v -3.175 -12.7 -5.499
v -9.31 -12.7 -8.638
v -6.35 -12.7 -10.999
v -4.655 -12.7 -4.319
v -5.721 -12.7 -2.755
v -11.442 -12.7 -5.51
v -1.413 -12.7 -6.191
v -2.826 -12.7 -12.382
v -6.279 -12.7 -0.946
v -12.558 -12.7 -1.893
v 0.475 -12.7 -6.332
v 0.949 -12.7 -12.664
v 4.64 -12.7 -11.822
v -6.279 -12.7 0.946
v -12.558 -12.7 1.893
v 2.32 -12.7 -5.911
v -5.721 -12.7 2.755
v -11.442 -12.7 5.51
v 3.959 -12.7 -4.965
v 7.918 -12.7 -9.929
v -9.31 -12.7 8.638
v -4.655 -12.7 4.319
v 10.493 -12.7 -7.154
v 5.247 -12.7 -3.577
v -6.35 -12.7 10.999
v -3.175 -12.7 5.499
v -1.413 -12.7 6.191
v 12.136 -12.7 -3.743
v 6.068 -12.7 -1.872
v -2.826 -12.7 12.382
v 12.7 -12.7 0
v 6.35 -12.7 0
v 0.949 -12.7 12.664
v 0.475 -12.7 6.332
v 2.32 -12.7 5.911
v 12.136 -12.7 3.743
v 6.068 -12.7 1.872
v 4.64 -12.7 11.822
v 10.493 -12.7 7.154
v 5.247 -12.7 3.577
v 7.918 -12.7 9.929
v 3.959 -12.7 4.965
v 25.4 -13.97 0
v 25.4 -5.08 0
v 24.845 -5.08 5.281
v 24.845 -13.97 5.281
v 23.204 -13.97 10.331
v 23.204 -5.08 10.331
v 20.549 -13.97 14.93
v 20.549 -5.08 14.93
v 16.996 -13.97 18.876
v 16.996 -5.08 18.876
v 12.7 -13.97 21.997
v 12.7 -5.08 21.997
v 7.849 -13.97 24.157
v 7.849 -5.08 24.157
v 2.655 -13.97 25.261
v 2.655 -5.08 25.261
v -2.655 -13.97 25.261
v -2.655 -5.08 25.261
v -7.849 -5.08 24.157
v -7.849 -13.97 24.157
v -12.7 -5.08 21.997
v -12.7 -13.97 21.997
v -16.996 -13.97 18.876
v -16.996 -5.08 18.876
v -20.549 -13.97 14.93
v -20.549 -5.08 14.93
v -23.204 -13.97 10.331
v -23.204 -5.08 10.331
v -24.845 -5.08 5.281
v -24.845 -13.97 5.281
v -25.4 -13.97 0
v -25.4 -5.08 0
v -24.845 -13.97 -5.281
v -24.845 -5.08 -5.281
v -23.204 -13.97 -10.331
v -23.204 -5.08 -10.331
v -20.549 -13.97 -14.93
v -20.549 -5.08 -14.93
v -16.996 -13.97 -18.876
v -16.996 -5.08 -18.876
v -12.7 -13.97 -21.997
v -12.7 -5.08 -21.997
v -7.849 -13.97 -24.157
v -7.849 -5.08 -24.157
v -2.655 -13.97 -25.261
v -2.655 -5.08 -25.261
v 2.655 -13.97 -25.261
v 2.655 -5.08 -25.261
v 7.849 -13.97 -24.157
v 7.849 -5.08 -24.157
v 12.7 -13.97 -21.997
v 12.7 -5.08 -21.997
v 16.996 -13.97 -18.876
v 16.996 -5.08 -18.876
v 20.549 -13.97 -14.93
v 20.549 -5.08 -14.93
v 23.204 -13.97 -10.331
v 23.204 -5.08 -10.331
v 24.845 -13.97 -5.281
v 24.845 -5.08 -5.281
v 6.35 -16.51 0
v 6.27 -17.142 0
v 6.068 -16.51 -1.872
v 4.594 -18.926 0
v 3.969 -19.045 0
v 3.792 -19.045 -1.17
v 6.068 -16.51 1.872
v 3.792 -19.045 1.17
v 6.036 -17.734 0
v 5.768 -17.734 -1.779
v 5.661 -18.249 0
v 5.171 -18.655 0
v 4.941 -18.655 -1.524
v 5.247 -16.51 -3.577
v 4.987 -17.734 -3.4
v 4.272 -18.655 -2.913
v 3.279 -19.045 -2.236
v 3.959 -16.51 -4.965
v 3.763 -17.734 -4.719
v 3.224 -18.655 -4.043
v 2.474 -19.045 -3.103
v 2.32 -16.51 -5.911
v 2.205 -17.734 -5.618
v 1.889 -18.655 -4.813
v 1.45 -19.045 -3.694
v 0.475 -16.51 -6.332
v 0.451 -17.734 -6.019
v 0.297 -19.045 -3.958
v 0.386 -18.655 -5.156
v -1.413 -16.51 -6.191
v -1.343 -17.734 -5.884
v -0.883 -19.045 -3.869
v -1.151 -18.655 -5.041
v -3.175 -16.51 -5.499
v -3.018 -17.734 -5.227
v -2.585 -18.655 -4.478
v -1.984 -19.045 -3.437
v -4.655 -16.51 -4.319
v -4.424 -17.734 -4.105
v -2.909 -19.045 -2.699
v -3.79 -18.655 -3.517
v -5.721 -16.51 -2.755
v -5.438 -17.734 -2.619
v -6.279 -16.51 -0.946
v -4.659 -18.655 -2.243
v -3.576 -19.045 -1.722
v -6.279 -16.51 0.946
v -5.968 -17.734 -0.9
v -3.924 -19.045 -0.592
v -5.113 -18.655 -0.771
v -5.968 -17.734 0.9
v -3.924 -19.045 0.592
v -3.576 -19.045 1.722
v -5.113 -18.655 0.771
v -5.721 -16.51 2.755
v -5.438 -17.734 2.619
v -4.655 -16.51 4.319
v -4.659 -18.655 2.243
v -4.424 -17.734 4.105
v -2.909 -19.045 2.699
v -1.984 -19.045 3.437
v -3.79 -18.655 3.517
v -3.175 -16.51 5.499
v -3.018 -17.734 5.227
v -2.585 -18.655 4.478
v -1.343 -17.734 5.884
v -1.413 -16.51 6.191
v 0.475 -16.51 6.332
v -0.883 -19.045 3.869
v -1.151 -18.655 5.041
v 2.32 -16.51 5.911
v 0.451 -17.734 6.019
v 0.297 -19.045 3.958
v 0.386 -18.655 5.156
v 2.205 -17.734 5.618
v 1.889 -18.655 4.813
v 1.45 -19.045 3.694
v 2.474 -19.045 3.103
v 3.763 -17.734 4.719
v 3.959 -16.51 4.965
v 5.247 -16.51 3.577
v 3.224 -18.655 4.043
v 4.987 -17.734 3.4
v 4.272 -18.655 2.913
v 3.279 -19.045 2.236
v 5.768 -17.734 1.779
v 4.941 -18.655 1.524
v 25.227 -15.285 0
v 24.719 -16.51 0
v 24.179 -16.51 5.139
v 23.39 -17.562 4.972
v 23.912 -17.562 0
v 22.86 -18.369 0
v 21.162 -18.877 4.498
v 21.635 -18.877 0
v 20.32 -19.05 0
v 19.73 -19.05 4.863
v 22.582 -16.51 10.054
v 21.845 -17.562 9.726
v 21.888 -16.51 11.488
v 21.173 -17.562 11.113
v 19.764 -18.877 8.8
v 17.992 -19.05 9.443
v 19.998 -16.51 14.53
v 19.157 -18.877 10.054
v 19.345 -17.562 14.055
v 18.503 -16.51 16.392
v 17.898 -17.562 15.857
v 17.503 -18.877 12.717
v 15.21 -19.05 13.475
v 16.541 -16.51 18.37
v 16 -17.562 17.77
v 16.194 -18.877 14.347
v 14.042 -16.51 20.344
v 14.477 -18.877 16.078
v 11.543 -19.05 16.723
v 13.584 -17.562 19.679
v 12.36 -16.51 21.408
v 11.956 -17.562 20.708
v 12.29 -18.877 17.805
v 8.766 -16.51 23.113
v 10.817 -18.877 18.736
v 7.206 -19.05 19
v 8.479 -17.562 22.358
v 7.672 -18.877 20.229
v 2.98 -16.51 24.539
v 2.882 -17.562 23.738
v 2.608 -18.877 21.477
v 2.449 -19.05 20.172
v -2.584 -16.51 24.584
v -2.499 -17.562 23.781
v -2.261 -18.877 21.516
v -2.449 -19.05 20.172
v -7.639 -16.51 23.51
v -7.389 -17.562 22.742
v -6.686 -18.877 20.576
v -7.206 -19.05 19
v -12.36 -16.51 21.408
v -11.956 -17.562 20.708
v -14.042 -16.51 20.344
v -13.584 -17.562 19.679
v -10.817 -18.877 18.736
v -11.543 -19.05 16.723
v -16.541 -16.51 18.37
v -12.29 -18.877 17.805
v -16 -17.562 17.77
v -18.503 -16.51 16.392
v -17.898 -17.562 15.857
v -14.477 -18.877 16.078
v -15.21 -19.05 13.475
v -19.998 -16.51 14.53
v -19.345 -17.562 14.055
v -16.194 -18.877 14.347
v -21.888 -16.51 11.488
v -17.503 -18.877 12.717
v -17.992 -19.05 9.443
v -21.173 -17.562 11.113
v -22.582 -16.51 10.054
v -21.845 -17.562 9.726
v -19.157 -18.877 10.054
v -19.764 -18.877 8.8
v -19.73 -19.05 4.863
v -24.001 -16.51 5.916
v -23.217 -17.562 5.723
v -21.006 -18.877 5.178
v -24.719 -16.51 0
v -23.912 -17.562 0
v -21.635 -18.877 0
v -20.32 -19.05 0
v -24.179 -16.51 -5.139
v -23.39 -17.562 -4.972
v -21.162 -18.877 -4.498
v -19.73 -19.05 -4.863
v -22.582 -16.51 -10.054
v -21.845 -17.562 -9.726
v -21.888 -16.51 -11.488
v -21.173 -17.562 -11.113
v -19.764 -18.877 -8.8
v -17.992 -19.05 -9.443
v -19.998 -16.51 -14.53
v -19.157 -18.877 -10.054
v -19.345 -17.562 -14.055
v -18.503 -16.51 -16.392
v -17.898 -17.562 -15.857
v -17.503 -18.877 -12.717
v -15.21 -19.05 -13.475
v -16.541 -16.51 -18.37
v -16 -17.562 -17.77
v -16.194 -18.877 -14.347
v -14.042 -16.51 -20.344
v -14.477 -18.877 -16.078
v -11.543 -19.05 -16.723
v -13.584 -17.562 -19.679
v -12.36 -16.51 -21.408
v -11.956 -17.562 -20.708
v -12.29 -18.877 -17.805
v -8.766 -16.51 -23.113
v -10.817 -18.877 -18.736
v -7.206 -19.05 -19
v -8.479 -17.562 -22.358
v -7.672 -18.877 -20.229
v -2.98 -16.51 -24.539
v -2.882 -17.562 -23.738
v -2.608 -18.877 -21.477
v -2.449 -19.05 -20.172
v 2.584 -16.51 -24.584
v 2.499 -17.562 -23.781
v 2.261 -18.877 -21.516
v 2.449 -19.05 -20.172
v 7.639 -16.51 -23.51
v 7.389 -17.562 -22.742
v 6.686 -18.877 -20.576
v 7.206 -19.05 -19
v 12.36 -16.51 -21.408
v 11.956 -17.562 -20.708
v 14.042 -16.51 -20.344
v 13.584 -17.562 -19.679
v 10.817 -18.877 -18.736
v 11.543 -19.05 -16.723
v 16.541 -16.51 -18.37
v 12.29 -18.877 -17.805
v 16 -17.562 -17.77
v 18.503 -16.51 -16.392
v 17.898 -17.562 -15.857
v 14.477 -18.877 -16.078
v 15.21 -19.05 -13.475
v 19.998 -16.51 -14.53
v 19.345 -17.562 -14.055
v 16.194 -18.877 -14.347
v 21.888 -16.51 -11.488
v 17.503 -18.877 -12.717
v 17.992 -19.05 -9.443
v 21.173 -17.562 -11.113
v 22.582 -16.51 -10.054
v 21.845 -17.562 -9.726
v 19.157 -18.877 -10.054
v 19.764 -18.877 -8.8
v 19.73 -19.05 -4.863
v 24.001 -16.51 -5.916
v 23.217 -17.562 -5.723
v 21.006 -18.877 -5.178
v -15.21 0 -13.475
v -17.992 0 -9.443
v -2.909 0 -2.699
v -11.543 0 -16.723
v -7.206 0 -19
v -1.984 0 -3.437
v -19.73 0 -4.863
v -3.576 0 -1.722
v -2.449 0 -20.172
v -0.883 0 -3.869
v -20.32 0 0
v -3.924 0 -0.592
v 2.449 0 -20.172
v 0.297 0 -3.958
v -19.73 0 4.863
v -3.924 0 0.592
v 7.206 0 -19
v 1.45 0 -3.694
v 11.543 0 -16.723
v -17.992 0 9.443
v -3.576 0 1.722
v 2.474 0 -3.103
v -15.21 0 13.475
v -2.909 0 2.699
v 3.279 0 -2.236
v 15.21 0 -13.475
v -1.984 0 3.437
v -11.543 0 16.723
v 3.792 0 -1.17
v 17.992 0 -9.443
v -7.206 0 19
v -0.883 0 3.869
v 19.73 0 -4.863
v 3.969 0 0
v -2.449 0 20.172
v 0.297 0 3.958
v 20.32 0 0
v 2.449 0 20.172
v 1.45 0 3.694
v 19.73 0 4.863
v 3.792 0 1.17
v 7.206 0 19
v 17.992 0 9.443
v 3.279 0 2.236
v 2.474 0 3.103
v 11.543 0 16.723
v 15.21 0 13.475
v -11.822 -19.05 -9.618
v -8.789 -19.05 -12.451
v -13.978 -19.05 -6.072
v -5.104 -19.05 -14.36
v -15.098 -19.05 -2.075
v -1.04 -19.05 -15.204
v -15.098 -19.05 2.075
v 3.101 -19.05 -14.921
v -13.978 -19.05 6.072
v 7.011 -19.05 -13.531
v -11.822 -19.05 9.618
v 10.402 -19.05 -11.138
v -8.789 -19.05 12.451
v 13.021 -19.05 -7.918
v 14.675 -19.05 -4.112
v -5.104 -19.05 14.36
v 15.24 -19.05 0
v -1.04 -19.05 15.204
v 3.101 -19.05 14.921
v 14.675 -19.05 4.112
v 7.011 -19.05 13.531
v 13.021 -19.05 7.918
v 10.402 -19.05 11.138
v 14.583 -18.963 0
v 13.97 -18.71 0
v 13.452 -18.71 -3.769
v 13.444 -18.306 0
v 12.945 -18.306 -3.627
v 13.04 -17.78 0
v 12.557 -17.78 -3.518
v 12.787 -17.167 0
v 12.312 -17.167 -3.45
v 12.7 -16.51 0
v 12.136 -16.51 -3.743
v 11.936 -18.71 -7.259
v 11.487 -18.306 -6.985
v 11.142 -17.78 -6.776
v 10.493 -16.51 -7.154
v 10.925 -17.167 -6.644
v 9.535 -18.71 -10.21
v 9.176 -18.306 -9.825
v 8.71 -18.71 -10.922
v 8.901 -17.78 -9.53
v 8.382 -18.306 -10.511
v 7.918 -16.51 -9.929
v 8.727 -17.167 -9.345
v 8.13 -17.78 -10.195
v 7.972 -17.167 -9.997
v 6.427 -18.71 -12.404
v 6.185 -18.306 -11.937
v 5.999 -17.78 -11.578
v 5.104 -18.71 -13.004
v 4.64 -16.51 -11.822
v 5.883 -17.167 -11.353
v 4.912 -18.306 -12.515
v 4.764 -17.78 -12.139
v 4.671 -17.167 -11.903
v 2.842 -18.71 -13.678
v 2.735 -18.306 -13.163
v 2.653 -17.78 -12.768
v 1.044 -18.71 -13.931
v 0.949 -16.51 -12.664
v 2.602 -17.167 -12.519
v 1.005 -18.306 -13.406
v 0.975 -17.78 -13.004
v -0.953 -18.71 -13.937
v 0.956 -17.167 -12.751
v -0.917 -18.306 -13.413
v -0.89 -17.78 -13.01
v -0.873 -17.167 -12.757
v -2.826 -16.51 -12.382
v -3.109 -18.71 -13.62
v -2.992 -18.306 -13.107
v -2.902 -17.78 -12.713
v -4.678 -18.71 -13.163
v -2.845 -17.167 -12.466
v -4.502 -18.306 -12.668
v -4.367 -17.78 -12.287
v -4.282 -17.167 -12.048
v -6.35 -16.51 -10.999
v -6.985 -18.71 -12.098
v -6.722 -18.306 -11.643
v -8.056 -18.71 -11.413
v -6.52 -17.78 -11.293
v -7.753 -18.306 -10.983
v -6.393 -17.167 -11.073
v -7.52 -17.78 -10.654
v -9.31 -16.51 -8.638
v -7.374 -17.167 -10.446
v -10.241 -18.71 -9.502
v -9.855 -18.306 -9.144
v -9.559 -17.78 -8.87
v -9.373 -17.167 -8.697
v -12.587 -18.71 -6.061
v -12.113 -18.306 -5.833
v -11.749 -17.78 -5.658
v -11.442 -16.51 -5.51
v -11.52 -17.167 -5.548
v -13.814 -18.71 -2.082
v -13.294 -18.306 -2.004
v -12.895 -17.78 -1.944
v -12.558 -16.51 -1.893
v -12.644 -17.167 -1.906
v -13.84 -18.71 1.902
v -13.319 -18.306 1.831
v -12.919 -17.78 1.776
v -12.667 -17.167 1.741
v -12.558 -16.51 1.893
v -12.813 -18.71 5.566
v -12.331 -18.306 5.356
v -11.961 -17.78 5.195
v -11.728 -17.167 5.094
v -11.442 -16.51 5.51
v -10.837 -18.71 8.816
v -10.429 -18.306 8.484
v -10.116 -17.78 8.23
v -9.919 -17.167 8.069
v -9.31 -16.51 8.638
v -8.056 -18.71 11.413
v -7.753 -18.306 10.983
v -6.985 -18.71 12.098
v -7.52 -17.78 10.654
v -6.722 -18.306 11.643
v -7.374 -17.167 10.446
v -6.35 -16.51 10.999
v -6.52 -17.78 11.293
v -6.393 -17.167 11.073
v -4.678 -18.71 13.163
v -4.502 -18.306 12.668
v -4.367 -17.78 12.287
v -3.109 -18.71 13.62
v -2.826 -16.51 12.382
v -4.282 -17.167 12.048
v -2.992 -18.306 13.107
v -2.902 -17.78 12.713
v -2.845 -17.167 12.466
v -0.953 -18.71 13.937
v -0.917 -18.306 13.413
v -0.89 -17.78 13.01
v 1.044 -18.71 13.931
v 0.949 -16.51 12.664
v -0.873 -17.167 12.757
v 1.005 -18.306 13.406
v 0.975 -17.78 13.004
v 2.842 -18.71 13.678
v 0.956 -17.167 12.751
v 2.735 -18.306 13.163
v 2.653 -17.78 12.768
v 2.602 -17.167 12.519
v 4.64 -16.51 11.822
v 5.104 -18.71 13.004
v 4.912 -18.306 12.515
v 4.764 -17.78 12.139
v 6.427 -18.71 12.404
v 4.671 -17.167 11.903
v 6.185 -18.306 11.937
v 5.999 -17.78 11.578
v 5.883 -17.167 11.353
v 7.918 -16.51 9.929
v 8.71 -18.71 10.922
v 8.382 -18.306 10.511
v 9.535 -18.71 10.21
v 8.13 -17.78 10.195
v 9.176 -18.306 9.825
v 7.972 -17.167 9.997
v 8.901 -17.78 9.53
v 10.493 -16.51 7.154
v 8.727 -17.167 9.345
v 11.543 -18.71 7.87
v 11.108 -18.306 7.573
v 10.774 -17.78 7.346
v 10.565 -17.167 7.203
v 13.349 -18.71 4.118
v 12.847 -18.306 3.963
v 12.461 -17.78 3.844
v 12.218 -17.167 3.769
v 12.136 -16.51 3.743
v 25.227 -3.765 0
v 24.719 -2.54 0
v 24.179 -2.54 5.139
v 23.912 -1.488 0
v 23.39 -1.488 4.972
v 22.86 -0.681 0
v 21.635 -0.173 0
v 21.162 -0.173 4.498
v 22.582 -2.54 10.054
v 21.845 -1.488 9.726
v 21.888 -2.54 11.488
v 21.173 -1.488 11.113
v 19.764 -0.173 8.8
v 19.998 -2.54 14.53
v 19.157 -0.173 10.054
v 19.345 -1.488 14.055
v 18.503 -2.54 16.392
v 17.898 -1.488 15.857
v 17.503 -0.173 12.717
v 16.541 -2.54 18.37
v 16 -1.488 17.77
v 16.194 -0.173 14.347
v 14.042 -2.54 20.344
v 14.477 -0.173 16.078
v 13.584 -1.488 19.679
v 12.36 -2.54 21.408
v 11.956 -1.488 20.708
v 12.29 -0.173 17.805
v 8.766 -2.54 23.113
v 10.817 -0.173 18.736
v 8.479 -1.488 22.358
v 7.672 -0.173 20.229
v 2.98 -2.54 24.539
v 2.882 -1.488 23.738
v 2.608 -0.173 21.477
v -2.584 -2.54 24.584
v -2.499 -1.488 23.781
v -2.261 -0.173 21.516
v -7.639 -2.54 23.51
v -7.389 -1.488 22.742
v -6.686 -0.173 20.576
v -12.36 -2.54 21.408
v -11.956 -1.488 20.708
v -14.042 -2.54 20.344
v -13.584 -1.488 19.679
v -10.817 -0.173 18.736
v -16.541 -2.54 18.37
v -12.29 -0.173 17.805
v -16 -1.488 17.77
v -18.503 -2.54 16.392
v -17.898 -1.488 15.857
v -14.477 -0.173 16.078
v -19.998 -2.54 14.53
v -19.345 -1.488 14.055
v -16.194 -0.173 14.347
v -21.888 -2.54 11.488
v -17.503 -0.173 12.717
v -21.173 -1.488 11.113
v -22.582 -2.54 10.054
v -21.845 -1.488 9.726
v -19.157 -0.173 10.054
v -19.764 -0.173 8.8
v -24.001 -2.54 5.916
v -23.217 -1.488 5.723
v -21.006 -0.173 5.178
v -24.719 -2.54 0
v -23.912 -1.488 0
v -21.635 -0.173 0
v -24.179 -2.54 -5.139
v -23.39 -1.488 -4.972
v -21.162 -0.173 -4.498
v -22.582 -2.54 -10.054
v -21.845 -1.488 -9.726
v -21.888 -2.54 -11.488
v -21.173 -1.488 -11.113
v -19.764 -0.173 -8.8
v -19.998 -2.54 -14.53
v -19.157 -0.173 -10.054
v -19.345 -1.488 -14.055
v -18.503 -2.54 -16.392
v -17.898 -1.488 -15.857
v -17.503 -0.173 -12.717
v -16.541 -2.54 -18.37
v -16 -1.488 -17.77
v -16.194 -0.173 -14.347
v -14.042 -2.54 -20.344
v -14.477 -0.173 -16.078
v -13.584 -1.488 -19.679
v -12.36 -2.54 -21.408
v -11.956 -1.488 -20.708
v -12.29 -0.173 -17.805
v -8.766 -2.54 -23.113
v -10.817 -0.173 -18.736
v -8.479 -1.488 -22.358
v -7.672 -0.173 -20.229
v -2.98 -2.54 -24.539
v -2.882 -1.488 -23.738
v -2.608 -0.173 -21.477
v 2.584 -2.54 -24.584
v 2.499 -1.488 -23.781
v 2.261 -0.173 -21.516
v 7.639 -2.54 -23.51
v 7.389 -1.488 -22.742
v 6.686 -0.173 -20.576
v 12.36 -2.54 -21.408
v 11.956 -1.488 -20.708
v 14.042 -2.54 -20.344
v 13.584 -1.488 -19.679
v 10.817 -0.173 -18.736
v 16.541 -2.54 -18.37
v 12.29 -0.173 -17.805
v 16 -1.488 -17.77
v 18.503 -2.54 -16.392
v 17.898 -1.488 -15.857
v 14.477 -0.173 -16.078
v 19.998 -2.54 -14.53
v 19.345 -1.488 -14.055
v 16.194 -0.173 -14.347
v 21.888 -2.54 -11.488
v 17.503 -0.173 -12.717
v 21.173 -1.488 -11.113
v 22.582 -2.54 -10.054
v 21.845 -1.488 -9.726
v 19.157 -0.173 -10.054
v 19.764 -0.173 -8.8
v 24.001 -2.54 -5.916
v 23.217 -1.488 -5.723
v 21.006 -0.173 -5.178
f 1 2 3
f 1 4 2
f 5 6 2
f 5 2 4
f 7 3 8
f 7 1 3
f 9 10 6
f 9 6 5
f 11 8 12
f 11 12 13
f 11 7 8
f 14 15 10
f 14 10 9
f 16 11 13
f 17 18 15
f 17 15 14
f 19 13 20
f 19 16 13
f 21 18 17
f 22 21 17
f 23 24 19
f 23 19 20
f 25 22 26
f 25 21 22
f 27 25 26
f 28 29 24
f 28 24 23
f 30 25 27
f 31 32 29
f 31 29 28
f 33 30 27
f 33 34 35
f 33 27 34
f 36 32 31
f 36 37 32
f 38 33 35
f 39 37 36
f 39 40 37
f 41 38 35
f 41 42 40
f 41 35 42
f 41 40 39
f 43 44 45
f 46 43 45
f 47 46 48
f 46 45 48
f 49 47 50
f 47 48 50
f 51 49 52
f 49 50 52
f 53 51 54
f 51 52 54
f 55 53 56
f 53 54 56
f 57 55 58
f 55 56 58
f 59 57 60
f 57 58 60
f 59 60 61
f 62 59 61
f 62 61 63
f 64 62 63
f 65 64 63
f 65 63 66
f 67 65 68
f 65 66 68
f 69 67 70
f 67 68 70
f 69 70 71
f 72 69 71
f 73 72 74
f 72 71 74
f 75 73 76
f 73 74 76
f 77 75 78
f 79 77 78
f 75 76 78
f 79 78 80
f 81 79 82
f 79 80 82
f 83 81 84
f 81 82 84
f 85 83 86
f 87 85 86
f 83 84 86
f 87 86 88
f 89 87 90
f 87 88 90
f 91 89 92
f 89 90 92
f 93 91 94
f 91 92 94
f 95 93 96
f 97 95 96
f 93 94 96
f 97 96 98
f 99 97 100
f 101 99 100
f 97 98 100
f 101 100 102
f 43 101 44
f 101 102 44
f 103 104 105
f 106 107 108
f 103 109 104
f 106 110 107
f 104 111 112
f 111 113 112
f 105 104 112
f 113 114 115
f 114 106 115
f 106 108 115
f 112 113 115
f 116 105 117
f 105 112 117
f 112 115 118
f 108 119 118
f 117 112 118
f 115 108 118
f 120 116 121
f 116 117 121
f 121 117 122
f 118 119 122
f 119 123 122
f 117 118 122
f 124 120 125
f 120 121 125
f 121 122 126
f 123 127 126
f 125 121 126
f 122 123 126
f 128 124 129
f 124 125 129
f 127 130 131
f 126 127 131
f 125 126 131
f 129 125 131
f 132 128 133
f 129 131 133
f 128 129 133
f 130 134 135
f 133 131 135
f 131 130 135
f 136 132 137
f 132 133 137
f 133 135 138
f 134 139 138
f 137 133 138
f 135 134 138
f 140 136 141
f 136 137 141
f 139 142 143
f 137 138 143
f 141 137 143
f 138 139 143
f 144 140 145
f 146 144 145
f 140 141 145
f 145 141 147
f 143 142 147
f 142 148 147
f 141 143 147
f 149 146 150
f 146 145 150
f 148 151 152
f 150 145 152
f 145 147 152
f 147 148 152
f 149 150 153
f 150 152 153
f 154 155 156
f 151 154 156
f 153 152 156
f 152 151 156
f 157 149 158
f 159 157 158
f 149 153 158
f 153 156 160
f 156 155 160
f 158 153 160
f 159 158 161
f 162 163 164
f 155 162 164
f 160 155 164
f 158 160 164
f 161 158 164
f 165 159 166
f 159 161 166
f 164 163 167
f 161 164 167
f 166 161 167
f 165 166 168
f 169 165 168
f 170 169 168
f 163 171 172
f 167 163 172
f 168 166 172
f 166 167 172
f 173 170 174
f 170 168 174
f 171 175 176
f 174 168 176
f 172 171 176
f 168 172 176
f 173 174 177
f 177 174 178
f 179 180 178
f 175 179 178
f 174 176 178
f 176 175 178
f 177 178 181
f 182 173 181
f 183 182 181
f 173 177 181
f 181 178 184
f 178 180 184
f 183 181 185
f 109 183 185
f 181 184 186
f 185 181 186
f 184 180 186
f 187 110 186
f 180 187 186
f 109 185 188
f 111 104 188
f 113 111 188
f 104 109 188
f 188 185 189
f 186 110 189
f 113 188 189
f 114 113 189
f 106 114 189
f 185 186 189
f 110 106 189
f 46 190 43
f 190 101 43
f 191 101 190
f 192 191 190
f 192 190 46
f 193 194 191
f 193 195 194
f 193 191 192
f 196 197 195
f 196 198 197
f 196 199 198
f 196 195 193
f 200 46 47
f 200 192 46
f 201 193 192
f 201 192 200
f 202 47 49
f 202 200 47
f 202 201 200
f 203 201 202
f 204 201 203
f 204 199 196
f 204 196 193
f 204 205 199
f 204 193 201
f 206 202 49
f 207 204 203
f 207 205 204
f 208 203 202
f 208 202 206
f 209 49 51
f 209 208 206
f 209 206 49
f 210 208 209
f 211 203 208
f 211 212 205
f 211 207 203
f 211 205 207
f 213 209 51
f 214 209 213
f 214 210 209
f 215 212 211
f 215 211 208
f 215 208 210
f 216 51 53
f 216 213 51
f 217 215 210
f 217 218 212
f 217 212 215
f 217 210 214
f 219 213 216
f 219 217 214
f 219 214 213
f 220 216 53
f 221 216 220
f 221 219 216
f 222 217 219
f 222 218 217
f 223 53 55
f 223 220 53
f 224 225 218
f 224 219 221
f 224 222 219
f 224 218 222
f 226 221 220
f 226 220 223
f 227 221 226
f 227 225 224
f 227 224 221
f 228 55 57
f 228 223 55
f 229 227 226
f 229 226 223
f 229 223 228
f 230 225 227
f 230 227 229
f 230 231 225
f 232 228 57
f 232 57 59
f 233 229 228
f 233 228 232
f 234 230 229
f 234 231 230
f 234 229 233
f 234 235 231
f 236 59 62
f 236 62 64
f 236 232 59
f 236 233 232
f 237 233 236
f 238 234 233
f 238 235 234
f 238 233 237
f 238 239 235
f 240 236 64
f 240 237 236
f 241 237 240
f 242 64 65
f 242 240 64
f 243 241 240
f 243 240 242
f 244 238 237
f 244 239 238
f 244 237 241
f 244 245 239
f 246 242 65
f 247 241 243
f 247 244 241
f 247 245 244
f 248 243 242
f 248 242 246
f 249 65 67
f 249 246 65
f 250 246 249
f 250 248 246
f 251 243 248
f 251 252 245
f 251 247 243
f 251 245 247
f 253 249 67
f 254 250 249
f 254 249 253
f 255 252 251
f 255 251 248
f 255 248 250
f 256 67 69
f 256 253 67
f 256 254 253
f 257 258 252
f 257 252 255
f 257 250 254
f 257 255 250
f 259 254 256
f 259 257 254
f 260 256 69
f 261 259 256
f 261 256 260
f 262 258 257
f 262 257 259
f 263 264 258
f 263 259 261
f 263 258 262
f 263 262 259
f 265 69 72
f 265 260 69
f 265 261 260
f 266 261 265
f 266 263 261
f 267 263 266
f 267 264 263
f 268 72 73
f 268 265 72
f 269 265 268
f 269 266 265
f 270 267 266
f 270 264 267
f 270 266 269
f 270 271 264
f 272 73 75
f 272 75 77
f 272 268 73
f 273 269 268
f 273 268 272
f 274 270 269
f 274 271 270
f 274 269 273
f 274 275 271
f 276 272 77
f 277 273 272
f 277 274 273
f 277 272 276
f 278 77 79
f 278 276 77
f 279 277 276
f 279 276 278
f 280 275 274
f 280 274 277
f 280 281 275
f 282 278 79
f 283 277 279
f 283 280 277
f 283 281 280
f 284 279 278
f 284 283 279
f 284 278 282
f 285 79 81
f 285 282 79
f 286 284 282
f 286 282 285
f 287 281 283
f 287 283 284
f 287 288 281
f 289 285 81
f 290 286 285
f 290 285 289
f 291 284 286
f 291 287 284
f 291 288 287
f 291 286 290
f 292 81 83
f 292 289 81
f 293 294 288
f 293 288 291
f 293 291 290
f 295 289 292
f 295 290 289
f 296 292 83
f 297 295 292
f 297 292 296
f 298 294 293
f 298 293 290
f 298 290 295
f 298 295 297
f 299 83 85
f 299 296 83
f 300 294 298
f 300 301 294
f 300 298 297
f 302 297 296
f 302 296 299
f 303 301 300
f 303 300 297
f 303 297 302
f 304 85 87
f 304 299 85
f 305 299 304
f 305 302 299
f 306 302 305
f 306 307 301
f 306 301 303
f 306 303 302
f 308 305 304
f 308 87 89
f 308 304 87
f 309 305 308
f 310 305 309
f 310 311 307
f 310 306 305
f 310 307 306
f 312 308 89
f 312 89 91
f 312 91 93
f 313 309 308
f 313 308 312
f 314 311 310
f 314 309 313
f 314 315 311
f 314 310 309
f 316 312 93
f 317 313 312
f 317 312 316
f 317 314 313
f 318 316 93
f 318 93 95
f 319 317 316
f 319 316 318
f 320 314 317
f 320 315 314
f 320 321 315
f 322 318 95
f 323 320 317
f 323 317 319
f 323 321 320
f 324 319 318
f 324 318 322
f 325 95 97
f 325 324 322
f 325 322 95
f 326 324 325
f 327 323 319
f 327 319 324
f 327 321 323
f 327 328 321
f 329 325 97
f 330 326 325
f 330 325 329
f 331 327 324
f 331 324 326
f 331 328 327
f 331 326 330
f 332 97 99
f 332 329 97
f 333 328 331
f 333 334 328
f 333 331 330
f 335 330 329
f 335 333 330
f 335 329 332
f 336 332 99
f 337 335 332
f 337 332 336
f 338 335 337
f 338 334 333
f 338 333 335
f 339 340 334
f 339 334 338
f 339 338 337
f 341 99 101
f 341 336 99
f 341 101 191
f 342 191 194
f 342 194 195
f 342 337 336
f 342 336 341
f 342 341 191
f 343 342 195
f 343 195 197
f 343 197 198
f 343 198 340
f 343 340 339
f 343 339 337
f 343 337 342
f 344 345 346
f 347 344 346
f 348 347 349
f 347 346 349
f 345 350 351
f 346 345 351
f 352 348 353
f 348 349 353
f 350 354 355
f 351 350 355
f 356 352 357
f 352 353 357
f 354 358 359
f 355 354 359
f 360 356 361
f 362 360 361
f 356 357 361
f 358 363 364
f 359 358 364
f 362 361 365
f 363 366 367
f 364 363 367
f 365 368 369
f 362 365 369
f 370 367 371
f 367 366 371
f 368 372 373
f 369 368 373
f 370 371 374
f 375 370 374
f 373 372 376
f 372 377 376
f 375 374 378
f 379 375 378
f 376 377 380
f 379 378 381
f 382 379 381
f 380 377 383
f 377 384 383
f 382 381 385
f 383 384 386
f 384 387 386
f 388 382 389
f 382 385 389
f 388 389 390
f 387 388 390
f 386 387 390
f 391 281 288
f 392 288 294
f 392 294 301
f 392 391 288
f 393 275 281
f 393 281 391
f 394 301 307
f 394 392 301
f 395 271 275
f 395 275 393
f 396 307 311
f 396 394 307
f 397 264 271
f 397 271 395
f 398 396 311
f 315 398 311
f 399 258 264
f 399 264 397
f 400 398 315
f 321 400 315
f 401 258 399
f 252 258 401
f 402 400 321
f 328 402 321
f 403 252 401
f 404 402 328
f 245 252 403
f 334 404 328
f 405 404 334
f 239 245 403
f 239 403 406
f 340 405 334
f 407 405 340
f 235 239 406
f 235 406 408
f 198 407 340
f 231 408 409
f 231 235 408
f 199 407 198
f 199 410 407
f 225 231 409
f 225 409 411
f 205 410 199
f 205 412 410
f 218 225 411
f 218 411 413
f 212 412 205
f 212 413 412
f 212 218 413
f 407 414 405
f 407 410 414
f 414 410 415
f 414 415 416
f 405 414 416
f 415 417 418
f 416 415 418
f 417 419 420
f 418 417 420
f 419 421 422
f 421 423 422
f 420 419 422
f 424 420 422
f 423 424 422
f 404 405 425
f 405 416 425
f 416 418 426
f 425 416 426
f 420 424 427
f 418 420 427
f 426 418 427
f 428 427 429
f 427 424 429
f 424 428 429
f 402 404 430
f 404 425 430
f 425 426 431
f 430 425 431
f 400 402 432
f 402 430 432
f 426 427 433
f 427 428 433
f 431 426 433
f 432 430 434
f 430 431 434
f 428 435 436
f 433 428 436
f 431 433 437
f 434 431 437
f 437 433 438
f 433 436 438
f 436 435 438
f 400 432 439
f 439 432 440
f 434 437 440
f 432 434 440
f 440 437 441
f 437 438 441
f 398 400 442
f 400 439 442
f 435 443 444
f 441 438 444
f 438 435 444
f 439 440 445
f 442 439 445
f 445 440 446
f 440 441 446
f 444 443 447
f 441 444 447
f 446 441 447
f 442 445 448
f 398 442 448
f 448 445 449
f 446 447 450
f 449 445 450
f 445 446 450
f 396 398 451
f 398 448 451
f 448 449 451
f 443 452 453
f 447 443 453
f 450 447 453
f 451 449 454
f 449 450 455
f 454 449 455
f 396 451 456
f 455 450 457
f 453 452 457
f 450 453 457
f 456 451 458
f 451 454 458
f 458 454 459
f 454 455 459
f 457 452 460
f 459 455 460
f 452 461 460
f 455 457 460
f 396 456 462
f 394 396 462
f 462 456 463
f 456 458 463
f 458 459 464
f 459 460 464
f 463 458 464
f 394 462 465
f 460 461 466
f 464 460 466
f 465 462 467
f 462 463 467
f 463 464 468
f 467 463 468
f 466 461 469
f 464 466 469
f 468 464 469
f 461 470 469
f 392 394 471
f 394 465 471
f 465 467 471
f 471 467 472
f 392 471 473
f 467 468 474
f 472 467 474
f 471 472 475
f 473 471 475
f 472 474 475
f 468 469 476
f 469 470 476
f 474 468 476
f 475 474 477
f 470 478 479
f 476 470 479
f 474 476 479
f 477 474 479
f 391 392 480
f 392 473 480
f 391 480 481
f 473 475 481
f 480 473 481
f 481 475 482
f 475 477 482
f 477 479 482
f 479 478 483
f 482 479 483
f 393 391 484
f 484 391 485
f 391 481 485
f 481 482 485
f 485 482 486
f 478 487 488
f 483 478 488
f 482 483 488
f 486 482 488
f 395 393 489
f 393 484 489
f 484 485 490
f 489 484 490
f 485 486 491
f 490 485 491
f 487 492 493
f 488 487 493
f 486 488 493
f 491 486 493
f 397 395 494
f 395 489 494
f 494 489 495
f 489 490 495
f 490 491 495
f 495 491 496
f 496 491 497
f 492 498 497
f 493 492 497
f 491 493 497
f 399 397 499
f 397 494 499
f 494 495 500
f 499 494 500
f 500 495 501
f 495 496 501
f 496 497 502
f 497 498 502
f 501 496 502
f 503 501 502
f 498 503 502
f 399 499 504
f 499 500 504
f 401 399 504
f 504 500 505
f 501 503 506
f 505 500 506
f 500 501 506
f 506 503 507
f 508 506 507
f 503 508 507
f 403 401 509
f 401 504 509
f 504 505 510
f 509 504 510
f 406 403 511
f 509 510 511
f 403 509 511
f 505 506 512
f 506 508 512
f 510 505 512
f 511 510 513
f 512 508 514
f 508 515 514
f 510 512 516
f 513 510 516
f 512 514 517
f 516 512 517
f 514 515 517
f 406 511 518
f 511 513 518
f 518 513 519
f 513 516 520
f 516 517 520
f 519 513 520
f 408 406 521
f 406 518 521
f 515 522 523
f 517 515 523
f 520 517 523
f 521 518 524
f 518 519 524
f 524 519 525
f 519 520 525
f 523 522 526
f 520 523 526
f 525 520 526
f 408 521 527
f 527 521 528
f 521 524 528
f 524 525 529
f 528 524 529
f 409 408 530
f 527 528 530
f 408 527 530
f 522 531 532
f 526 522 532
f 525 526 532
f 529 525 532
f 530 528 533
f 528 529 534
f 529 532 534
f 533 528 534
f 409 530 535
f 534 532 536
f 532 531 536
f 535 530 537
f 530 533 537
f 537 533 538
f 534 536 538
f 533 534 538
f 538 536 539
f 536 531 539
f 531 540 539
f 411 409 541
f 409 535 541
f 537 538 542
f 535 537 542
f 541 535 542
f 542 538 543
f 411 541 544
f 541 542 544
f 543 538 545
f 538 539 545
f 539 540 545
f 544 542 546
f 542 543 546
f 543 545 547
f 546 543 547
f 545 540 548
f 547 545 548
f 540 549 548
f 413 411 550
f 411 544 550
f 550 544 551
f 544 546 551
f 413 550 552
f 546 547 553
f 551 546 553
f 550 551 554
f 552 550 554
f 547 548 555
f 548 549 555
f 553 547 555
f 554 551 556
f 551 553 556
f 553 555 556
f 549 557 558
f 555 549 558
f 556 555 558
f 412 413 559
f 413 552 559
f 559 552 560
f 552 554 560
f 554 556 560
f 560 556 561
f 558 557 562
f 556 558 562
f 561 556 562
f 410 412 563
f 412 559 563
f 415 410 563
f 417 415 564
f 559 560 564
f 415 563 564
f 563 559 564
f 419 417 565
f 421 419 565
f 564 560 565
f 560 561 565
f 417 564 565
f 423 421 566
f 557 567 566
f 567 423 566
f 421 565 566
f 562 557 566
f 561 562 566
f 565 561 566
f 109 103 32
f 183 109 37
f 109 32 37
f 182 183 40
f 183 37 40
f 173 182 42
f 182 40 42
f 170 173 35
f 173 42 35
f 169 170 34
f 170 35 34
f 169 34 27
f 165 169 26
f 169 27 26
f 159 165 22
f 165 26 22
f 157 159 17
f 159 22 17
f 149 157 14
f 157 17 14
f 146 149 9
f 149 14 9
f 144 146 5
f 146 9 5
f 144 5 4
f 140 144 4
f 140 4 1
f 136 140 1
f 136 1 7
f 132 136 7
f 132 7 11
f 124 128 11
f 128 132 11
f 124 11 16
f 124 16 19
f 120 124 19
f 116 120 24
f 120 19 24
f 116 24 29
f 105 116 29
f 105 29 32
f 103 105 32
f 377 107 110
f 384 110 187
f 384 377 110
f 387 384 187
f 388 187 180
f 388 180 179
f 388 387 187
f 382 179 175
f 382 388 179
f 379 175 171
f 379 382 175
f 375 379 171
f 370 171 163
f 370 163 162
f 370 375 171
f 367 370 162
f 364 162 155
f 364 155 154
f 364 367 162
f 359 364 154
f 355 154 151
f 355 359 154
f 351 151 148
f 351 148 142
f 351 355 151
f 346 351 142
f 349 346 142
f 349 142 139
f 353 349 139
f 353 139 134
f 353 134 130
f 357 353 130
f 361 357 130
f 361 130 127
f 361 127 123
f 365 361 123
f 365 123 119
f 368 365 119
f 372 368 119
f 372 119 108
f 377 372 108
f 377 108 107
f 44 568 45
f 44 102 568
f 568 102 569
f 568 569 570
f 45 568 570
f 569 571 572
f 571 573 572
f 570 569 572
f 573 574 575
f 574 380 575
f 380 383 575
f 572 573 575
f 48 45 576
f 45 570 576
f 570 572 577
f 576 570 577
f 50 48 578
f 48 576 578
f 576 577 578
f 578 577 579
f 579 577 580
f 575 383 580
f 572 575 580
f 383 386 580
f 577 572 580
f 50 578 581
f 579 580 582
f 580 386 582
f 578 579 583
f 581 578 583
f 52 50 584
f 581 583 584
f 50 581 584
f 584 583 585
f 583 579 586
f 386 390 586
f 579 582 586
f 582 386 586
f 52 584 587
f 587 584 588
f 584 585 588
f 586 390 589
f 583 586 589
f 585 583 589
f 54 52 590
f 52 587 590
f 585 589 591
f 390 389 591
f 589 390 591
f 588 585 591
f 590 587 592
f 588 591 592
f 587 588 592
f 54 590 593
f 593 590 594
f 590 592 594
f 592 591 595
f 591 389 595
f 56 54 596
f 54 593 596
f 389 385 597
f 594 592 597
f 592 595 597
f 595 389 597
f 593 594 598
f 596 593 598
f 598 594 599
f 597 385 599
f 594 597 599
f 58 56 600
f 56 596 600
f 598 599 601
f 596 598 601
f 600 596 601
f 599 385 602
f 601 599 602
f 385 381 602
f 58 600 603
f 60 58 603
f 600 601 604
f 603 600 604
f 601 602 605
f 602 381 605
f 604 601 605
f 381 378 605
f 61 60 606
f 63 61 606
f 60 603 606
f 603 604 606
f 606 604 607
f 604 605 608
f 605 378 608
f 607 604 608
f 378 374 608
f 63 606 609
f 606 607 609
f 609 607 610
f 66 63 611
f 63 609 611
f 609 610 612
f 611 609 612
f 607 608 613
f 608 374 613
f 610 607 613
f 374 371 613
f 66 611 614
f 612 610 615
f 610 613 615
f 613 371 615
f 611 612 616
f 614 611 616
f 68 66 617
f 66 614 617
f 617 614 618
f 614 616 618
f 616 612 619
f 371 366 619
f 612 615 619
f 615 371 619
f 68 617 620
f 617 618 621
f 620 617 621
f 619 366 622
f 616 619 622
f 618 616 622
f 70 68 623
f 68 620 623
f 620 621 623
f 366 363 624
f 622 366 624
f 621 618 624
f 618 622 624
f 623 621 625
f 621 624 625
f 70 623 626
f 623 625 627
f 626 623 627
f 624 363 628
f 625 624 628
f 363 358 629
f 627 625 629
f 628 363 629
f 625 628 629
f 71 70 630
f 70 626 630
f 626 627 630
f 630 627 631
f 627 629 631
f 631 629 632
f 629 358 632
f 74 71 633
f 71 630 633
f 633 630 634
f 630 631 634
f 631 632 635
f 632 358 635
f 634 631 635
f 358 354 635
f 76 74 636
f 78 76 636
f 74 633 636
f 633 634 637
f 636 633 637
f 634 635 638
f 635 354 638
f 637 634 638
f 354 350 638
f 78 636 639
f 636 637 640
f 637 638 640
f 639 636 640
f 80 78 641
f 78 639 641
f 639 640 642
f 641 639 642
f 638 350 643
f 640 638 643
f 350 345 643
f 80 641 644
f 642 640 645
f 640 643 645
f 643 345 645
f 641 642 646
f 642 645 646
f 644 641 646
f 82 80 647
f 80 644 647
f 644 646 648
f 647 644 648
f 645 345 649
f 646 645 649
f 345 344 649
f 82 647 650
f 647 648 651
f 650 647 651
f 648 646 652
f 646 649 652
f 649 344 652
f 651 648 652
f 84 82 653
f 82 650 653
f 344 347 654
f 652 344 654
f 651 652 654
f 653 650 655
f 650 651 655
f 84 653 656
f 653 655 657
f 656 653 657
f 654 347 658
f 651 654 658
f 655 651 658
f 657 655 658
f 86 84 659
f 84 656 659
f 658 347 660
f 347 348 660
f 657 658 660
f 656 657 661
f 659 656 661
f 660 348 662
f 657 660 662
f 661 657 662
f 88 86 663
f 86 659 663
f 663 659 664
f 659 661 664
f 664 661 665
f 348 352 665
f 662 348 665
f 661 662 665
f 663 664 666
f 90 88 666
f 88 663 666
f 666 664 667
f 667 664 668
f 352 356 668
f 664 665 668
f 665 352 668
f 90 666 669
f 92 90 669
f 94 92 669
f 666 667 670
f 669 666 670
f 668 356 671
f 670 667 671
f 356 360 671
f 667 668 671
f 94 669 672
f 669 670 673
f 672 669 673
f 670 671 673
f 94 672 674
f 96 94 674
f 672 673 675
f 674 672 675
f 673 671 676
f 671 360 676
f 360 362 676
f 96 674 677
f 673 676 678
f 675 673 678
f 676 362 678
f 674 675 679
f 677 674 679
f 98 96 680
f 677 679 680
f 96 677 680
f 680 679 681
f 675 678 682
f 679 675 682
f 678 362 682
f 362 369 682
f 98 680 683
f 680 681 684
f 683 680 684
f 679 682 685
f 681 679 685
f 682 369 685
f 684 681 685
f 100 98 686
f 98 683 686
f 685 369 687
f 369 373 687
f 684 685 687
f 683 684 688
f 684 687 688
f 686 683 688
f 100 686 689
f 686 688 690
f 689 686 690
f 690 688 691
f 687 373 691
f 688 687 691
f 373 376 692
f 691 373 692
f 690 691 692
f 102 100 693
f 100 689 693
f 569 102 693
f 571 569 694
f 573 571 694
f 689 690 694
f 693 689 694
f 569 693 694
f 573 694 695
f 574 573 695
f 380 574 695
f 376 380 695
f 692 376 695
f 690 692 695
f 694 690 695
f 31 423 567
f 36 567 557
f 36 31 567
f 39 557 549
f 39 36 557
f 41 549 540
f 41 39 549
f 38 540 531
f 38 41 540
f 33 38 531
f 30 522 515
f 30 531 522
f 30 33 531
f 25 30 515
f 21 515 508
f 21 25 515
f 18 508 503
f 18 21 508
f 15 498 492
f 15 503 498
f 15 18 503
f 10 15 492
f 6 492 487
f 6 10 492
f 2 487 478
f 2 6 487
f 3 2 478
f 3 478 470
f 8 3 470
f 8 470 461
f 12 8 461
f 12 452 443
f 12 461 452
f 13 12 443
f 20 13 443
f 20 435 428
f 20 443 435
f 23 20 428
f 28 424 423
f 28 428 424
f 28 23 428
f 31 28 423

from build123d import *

# Parameters (mm, degrees)
F0_R     = 25.4
F1_DEPTH = 19.05
F2_R     = 5.08
F4_START = 12.7
F3_R     = 12.7
F3_R_2   = 6.35
F4_DEPTH = 12.7
F5_R     = 2.54
F6_R     = 3.96875
F7_DEPTH = 19.051


with BuildPart() as f1:
    # F0 (on Front) → F1 (new body)
    with BuildSketch(Plane.XZ):
        Circle(F0_R)
    extrude(amount=F1_DEPTH)

    # F2
    f2_edges = [f1.edges().sort_by_distance(p)[0] for p in [
        (-25.4, -19.05, 0),
        (-25.4, 0, 0),
    ]]
    fillet(f2_edges, radius=F2_R)

    # F3 (on Front) → F4 (cut)
    with BuildSketch(Plane.XZ.offset(F4_START)):
        Circle(F3_R)
        Circle(F3_R_2, mode=Mode.SUBTRACT)
    extrude(amount=F4_DEPTH, mode=Mode.SUBTRACT)

    # F5
    f5_edges = [f1.edges().sort_by_distance(p)[0] for p in [
        (-6.35, -19.05, 0),
        (-12.7, -19.05, 0),
    ]]
    fillet(f5_edges, radius=F5_R)

    # F6 (on Front) → F7 (cut, through all)
    with BuildSketch(Plane.XZ):
        Circle(F6_R)
    extrude(amount=F7_DEPTH, mode=Mode.SUBTRACT)


solid = f1.part
